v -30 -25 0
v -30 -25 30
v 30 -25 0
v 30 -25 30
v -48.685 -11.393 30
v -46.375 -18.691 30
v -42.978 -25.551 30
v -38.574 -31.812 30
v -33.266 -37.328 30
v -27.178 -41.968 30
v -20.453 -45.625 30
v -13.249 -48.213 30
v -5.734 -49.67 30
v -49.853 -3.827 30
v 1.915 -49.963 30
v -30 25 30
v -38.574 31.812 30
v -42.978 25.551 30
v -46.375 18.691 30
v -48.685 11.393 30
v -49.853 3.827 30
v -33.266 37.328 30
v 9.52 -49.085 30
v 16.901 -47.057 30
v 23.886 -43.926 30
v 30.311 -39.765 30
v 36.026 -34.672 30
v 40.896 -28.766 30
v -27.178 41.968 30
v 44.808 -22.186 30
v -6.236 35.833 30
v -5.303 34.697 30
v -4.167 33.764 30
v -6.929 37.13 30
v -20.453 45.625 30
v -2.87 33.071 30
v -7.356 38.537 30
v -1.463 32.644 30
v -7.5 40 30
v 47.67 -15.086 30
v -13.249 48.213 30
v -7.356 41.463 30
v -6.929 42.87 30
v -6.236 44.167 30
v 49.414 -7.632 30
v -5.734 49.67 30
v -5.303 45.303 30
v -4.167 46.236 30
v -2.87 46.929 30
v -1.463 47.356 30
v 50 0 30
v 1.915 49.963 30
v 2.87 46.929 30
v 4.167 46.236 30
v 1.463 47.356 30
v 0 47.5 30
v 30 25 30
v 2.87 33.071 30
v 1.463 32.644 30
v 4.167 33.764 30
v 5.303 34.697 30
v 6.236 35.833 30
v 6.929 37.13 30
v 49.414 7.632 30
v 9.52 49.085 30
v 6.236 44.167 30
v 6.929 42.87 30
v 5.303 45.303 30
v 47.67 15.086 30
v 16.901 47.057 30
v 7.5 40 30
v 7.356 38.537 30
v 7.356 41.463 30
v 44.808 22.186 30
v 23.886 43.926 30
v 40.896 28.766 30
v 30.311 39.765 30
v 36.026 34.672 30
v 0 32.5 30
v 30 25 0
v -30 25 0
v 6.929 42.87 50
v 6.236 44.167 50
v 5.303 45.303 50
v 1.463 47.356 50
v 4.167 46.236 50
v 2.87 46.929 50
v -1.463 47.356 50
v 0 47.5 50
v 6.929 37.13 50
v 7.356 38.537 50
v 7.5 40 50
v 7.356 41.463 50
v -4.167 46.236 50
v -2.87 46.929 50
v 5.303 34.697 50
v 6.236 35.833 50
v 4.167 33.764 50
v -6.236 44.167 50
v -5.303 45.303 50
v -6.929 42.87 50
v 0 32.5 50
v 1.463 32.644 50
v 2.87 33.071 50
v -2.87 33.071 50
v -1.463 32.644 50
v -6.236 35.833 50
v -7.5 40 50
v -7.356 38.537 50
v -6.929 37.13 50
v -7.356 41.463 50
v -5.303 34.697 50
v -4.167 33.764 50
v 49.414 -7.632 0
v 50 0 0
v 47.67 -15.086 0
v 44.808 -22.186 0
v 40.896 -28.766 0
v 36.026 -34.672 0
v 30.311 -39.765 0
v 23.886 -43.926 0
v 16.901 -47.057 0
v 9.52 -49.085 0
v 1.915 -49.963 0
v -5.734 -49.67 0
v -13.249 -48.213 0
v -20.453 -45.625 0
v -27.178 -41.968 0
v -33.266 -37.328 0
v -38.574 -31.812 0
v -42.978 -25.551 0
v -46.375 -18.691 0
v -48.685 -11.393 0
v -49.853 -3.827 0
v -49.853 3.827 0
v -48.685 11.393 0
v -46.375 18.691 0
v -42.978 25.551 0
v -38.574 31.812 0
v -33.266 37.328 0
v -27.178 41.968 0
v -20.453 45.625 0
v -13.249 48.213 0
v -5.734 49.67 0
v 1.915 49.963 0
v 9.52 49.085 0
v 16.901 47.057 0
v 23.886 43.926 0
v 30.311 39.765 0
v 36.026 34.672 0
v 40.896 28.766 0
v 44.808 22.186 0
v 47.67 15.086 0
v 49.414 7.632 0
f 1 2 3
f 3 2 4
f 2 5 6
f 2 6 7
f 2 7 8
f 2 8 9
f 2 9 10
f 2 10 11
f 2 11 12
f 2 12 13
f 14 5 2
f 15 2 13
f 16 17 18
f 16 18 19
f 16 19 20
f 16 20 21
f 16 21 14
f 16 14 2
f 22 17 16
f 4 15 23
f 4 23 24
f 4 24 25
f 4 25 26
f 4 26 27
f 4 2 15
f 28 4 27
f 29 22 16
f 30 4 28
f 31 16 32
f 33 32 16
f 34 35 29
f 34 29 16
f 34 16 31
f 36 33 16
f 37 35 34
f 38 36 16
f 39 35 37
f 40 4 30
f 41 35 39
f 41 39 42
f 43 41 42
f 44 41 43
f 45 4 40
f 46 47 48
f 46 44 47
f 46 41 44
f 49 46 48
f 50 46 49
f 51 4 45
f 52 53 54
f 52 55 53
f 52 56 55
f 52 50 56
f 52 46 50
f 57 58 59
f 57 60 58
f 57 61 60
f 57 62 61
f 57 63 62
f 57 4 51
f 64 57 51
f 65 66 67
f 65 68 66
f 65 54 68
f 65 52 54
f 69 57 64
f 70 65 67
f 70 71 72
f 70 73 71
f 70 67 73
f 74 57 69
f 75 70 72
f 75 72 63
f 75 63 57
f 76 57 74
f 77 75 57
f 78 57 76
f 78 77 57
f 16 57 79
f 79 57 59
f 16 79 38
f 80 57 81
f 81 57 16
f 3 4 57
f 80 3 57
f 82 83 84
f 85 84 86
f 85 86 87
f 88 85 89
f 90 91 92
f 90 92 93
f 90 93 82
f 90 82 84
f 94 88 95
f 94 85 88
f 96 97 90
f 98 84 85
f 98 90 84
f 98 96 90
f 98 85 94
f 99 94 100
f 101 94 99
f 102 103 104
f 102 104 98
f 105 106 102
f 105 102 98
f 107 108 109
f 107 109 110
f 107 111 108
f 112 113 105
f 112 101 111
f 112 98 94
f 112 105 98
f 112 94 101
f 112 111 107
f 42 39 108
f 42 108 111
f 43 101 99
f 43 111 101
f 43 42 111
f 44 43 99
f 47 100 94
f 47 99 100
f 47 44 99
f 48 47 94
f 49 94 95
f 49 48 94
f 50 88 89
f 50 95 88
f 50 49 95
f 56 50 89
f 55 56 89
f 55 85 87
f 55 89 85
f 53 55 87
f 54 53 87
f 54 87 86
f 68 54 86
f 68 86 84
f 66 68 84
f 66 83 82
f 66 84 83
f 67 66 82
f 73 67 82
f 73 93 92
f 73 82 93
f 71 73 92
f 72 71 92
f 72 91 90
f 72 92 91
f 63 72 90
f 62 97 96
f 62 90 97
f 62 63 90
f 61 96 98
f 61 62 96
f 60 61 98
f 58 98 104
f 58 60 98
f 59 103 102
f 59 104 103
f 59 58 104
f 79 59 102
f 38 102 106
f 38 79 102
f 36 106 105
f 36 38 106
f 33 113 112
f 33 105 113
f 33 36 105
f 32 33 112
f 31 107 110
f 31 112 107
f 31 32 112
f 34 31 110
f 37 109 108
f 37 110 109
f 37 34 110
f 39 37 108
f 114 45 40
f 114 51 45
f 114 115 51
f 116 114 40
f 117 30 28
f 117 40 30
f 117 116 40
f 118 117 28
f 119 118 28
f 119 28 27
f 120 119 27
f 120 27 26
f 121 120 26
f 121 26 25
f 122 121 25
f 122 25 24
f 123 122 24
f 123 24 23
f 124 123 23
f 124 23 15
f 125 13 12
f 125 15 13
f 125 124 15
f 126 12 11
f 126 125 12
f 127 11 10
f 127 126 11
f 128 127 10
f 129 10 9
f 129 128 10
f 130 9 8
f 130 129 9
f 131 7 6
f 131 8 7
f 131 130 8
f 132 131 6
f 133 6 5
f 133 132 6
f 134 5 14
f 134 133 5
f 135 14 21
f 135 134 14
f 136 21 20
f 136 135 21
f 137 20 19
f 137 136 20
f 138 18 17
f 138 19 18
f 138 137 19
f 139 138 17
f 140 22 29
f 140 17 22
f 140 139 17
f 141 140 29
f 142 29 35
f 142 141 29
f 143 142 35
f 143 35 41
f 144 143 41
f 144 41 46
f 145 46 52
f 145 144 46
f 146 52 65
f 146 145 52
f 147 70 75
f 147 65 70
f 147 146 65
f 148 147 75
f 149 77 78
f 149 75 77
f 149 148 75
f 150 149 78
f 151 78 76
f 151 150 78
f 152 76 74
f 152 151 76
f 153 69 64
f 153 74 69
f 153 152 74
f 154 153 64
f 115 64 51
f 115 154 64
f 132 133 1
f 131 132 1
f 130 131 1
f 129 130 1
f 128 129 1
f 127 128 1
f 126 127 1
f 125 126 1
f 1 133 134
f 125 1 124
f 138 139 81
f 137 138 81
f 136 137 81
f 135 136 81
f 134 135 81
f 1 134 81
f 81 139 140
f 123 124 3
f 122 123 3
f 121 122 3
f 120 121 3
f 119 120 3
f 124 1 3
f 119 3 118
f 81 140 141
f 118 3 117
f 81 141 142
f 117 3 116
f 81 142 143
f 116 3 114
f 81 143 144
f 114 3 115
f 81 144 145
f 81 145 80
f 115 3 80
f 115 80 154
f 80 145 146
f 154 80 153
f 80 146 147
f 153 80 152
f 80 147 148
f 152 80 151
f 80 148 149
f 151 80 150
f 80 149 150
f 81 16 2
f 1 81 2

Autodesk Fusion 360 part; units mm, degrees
sketch "Sketch1" plane through (0, 0, 0) normal (0, 0, 1) x (1, 0, 0)
  circle A0 centre (0, 0) radius 50
  dimension "d1" = 100
extrude "Extrude1" add sketch "Sketch1" along normal blind 30
sketch "Sketch2" plane through (0, 0, 30) normal (0, 0, 1) x (-1, 0, 0)
  circle A0 centre (0, 0) radius 50
  line L0 (30, 25) -> (-30, 25)
  line L1 (-30, 25) -> (-30, -25)
  line L2 (-30, -25) -> (30, -25)
  line L3 (30, -25) -> (30, 25)
  line L4 (30, 25) -> (-30, -25) construction
  line L5 (-30, 25) -> (30, -25) construction
  dimension "d4" = 60
  dimension "d5" = 50
extrude "Extrude2" cut sketch "Sketch2" against normal blind 30 contours L0 L1 L2 L3
sketch "Sketch3" plane through (0, 0, 30) normal (0, 0, 1) x (-1, 0, 0)
  line L0 (-30, 25) -> (30, 25)
  line L1 (30, 25) -> (30, -25)
  line L2 (30, -25) -> (-30, -25)
  line L3 (-30, -25) -> (-30, 25)
  circle A0 centre (0, 0) radius 50
  circle A1 centre (0, -40) radius 7.5
  dimension "d8" = 15
extrude "Extrude3" add sketch "Sketch3" along normal blind 20 contours A1
